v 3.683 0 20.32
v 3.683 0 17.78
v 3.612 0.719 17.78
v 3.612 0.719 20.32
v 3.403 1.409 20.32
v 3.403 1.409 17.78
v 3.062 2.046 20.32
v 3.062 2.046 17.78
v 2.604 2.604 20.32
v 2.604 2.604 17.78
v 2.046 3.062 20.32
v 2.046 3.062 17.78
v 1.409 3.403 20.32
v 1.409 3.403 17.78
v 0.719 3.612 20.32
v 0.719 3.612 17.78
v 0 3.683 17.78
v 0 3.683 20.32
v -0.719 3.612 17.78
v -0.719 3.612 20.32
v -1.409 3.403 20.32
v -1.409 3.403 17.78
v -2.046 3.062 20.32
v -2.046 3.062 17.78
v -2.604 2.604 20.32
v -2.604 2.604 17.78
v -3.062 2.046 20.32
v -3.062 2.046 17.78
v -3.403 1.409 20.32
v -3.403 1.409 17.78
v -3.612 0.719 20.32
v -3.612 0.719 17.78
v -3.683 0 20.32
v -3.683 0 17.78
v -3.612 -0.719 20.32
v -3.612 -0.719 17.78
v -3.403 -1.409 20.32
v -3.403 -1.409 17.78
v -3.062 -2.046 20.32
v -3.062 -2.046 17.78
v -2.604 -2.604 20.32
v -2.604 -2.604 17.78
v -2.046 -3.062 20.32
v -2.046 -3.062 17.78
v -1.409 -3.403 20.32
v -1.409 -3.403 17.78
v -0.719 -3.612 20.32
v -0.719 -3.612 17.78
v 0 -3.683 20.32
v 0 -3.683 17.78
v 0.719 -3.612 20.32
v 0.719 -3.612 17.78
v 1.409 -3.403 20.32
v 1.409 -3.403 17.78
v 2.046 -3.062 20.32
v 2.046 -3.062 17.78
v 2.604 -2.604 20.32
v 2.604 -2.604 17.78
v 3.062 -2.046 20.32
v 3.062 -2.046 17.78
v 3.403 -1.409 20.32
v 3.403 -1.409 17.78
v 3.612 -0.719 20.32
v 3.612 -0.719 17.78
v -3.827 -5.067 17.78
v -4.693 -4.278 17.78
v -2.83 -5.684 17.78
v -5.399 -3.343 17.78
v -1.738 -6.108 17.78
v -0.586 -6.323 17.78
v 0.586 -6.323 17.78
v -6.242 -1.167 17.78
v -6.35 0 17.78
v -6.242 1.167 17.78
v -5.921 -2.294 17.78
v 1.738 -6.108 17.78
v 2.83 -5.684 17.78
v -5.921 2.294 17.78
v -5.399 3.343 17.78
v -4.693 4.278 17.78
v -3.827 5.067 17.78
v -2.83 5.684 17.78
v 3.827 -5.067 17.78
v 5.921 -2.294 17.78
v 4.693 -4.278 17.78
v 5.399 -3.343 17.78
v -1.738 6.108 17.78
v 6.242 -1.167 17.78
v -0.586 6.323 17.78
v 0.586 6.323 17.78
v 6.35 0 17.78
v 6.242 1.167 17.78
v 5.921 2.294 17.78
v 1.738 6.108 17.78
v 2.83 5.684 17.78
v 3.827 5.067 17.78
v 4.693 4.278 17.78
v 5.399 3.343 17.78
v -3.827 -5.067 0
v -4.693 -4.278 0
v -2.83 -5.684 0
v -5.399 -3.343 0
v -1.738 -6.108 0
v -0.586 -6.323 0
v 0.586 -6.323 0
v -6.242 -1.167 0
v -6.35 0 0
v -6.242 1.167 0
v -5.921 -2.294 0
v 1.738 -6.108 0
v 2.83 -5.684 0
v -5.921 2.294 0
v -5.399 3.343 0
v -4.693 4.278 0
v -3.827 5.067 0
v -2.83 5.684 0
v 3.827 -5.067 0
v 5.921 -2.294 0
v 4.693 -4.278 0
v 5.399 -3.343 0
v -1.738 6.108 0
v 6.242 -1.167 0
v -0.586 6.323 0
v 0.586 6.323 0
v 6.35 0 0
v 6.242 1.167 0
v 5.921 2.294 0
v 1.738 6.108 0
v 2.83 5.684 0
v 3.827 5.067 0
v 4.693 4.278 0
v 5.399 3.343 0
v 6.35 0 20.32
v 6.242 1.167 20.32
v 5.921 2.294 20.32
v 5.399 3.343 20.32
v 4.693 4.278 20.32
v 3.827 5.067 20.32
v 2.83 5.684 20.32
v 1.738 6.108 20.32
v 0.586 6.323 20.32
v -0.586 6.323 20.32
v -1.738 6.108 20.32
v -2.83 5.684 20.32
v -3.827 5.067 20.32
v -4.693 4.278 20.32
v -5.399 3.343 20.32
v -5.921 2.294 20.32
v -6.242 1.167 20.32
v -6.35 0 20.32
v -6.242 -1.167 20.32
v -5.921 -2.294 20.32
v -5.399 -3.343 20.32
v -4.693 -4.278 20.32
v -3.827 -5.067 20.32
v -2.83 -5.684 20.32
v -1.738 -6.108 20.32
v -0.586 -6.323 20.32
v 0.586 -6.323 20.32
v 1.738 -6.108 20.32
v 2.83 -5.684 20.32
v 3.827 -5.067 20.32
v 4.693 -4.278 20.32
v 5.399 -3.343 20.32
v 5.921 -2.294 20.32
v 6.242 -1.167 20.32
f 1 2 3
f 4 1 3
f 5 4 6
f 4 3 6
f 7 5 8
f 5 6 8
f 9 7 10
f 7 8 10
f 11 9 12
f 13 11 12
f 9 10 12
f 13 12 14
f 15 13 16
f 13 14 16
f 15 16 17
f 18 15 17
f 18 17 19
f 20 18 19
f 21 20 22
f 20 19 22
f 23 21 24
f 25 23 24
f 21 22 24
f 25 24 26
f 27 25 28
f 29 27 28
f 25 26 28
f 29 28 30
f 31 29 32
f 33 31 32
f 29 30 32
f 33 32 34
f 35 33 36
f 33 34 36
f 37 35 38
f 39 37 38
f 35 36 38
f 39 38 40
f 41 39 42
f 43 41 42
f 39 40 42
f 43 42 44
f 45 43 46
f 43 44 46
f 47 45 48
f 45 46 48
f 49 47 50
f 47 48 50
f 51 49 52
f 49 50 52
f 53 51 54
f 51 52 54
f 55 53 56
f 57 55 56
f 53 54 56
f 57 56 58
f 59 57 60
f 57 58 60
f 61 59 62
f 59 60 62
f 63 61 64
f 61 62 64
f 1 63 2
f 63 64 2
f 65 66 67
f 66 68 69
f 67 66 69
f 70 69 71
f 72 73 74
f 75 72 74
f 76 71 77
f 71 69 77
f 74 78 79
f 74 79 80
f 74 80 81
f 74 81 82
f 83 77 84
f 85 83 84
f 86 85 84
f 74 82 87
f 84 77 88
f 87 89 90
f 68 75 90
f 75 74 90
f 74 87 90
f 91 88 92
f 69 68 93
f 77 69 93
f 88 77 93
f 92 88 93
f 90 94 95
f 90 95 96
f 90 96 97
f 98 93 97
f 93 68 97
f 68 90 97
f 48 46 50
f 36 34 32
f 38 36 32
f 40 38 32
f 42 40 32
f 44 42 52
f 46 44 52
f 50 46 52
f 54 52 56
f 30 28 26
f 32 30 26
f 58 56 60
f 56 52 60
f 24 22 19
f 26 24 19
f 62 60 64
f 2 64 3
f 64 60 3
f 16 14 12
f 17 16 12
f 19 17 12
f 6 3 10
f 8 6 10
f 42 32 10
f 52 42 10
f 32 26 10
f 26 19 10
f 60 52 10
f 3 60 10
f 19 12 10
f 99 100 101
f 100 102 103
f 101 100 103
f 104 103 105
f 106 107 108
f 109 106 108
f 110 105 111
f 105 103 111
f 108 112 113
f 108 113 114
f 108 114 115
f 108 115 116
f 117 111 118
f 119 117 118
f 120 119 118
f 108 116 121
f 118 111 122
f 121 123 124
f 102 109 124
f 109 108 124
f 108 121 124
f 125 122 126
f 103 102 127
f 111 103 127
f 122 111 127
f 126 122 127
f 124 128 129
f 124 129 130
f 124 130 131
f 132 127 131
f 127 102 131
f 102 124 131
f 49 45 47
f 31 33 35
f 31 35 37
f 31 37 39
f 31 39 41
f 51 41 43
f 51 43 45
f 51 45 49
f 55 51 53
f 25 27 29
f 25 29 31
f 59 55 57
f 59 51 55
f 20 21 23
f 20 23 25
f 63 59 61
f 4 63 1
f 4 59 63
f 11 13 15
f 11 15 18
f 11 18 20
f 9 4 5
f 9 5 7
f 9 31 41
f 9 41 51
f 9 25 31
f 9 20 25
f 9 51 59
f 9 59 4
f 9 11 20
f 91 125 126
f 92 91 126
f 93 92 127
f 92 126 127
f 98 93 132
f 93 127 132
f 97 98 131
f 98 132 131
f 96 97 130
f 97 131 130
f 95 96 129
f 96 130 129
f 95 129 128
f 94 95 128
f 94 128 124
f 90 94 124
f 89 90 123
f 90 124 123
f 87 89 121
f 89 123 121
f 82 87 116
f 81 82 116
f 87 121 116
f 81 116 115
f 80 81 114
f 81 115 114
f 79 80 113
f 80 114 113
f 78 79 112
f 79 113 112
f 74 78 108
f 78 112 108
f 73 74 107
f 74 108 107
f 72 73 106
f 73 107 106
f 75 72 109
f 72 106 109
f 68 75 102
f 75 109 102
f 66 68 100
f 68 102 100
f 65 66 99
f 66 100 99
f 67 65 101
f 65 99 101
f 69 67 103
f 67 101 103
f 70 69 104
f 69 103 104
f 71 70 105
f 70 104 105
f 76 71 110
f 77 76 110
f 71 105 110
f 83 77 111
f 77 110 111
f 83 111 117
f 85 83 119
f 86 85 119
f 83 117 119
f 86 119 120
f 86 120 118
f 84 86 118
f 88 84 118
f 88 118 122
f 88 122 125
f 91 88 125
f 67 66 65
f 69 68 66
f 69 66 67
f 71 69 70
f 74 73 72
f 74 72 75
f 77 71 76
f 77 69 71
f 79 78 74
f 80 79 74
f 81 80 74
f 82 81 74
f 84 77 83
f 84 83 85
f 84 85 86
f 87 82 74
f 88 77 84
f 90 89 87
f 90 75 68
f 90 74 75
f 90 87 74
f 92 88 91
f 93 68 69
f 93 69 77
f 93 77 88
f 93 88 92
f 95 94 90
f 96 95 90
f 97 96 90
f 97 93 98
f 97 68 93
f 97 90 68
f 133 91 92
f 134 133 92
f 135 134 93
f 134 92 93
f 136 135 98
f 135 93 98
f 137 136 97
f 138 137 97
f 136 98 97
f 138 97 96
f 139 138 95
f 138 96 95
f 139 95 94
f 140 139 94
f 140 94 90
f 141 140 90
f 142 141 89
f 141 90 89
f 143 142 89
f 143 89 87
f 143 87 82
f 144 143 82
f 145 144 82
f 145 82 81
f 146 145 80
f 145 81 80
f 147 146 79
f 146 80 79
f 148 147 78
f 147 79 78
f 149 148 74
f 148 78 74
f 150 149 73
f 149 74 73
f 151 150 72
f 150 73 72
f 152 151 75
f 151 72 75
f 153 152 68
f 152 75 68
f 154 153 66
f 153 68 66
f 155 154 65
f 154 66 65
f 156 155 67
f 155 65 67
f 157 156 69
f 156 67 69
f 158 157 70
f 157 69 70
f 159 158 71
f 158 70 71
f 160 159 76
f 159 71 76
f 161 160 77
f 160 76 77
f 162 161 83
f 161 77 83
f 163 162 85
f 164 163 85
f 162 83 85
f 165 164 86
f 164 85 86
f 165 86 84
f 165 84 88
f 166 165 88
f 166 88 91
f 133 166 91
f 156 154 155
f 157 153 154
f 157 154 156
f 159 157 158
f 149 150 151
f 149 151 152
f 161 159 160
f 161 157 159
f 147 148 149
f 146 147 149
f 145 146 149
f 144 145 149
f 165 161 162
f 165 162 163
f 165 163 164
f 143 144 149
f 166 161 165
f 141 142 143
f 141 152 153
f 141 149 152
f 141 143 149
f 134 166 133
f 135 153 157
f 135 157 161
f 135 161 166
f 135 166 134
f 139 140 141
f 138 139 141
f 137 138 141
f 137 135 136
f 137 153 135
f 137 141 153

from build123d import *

# Parameters (mm, degrees)
F0_R      = 6.35
F1_DEPTH  = 17.78
F2_R      = 3.683
F3_DEPTH  = 2.54
F1_FACE_R = 6.35
F4_DEPTH  = 2.54


with BuildPart() as f1:
    # F0 (on Top) → F1 (new body)
    with BuildSketch(Plane.XY):
        Circle(F0_R)
    extrude(amount=F1_DEPTH)


with BuildPart() as f3:
    # F2 (on face) → F3 (new body)
    with BuildSketch(Plane.XY.offset(17.78)):
        Circle(F2_R)
    extrude(amount=F3_DEPTH)


with BuildPart() as f4:
    # F1_face (on face) → F4 (new body)
    with BuildSketch(Plane.XY.offset(17.78)):
        Circle(F1_FACE_R)
    extrude(amount=F4_DEPTH)


solid = Compound([f1.part, f3.part, f4.part])
